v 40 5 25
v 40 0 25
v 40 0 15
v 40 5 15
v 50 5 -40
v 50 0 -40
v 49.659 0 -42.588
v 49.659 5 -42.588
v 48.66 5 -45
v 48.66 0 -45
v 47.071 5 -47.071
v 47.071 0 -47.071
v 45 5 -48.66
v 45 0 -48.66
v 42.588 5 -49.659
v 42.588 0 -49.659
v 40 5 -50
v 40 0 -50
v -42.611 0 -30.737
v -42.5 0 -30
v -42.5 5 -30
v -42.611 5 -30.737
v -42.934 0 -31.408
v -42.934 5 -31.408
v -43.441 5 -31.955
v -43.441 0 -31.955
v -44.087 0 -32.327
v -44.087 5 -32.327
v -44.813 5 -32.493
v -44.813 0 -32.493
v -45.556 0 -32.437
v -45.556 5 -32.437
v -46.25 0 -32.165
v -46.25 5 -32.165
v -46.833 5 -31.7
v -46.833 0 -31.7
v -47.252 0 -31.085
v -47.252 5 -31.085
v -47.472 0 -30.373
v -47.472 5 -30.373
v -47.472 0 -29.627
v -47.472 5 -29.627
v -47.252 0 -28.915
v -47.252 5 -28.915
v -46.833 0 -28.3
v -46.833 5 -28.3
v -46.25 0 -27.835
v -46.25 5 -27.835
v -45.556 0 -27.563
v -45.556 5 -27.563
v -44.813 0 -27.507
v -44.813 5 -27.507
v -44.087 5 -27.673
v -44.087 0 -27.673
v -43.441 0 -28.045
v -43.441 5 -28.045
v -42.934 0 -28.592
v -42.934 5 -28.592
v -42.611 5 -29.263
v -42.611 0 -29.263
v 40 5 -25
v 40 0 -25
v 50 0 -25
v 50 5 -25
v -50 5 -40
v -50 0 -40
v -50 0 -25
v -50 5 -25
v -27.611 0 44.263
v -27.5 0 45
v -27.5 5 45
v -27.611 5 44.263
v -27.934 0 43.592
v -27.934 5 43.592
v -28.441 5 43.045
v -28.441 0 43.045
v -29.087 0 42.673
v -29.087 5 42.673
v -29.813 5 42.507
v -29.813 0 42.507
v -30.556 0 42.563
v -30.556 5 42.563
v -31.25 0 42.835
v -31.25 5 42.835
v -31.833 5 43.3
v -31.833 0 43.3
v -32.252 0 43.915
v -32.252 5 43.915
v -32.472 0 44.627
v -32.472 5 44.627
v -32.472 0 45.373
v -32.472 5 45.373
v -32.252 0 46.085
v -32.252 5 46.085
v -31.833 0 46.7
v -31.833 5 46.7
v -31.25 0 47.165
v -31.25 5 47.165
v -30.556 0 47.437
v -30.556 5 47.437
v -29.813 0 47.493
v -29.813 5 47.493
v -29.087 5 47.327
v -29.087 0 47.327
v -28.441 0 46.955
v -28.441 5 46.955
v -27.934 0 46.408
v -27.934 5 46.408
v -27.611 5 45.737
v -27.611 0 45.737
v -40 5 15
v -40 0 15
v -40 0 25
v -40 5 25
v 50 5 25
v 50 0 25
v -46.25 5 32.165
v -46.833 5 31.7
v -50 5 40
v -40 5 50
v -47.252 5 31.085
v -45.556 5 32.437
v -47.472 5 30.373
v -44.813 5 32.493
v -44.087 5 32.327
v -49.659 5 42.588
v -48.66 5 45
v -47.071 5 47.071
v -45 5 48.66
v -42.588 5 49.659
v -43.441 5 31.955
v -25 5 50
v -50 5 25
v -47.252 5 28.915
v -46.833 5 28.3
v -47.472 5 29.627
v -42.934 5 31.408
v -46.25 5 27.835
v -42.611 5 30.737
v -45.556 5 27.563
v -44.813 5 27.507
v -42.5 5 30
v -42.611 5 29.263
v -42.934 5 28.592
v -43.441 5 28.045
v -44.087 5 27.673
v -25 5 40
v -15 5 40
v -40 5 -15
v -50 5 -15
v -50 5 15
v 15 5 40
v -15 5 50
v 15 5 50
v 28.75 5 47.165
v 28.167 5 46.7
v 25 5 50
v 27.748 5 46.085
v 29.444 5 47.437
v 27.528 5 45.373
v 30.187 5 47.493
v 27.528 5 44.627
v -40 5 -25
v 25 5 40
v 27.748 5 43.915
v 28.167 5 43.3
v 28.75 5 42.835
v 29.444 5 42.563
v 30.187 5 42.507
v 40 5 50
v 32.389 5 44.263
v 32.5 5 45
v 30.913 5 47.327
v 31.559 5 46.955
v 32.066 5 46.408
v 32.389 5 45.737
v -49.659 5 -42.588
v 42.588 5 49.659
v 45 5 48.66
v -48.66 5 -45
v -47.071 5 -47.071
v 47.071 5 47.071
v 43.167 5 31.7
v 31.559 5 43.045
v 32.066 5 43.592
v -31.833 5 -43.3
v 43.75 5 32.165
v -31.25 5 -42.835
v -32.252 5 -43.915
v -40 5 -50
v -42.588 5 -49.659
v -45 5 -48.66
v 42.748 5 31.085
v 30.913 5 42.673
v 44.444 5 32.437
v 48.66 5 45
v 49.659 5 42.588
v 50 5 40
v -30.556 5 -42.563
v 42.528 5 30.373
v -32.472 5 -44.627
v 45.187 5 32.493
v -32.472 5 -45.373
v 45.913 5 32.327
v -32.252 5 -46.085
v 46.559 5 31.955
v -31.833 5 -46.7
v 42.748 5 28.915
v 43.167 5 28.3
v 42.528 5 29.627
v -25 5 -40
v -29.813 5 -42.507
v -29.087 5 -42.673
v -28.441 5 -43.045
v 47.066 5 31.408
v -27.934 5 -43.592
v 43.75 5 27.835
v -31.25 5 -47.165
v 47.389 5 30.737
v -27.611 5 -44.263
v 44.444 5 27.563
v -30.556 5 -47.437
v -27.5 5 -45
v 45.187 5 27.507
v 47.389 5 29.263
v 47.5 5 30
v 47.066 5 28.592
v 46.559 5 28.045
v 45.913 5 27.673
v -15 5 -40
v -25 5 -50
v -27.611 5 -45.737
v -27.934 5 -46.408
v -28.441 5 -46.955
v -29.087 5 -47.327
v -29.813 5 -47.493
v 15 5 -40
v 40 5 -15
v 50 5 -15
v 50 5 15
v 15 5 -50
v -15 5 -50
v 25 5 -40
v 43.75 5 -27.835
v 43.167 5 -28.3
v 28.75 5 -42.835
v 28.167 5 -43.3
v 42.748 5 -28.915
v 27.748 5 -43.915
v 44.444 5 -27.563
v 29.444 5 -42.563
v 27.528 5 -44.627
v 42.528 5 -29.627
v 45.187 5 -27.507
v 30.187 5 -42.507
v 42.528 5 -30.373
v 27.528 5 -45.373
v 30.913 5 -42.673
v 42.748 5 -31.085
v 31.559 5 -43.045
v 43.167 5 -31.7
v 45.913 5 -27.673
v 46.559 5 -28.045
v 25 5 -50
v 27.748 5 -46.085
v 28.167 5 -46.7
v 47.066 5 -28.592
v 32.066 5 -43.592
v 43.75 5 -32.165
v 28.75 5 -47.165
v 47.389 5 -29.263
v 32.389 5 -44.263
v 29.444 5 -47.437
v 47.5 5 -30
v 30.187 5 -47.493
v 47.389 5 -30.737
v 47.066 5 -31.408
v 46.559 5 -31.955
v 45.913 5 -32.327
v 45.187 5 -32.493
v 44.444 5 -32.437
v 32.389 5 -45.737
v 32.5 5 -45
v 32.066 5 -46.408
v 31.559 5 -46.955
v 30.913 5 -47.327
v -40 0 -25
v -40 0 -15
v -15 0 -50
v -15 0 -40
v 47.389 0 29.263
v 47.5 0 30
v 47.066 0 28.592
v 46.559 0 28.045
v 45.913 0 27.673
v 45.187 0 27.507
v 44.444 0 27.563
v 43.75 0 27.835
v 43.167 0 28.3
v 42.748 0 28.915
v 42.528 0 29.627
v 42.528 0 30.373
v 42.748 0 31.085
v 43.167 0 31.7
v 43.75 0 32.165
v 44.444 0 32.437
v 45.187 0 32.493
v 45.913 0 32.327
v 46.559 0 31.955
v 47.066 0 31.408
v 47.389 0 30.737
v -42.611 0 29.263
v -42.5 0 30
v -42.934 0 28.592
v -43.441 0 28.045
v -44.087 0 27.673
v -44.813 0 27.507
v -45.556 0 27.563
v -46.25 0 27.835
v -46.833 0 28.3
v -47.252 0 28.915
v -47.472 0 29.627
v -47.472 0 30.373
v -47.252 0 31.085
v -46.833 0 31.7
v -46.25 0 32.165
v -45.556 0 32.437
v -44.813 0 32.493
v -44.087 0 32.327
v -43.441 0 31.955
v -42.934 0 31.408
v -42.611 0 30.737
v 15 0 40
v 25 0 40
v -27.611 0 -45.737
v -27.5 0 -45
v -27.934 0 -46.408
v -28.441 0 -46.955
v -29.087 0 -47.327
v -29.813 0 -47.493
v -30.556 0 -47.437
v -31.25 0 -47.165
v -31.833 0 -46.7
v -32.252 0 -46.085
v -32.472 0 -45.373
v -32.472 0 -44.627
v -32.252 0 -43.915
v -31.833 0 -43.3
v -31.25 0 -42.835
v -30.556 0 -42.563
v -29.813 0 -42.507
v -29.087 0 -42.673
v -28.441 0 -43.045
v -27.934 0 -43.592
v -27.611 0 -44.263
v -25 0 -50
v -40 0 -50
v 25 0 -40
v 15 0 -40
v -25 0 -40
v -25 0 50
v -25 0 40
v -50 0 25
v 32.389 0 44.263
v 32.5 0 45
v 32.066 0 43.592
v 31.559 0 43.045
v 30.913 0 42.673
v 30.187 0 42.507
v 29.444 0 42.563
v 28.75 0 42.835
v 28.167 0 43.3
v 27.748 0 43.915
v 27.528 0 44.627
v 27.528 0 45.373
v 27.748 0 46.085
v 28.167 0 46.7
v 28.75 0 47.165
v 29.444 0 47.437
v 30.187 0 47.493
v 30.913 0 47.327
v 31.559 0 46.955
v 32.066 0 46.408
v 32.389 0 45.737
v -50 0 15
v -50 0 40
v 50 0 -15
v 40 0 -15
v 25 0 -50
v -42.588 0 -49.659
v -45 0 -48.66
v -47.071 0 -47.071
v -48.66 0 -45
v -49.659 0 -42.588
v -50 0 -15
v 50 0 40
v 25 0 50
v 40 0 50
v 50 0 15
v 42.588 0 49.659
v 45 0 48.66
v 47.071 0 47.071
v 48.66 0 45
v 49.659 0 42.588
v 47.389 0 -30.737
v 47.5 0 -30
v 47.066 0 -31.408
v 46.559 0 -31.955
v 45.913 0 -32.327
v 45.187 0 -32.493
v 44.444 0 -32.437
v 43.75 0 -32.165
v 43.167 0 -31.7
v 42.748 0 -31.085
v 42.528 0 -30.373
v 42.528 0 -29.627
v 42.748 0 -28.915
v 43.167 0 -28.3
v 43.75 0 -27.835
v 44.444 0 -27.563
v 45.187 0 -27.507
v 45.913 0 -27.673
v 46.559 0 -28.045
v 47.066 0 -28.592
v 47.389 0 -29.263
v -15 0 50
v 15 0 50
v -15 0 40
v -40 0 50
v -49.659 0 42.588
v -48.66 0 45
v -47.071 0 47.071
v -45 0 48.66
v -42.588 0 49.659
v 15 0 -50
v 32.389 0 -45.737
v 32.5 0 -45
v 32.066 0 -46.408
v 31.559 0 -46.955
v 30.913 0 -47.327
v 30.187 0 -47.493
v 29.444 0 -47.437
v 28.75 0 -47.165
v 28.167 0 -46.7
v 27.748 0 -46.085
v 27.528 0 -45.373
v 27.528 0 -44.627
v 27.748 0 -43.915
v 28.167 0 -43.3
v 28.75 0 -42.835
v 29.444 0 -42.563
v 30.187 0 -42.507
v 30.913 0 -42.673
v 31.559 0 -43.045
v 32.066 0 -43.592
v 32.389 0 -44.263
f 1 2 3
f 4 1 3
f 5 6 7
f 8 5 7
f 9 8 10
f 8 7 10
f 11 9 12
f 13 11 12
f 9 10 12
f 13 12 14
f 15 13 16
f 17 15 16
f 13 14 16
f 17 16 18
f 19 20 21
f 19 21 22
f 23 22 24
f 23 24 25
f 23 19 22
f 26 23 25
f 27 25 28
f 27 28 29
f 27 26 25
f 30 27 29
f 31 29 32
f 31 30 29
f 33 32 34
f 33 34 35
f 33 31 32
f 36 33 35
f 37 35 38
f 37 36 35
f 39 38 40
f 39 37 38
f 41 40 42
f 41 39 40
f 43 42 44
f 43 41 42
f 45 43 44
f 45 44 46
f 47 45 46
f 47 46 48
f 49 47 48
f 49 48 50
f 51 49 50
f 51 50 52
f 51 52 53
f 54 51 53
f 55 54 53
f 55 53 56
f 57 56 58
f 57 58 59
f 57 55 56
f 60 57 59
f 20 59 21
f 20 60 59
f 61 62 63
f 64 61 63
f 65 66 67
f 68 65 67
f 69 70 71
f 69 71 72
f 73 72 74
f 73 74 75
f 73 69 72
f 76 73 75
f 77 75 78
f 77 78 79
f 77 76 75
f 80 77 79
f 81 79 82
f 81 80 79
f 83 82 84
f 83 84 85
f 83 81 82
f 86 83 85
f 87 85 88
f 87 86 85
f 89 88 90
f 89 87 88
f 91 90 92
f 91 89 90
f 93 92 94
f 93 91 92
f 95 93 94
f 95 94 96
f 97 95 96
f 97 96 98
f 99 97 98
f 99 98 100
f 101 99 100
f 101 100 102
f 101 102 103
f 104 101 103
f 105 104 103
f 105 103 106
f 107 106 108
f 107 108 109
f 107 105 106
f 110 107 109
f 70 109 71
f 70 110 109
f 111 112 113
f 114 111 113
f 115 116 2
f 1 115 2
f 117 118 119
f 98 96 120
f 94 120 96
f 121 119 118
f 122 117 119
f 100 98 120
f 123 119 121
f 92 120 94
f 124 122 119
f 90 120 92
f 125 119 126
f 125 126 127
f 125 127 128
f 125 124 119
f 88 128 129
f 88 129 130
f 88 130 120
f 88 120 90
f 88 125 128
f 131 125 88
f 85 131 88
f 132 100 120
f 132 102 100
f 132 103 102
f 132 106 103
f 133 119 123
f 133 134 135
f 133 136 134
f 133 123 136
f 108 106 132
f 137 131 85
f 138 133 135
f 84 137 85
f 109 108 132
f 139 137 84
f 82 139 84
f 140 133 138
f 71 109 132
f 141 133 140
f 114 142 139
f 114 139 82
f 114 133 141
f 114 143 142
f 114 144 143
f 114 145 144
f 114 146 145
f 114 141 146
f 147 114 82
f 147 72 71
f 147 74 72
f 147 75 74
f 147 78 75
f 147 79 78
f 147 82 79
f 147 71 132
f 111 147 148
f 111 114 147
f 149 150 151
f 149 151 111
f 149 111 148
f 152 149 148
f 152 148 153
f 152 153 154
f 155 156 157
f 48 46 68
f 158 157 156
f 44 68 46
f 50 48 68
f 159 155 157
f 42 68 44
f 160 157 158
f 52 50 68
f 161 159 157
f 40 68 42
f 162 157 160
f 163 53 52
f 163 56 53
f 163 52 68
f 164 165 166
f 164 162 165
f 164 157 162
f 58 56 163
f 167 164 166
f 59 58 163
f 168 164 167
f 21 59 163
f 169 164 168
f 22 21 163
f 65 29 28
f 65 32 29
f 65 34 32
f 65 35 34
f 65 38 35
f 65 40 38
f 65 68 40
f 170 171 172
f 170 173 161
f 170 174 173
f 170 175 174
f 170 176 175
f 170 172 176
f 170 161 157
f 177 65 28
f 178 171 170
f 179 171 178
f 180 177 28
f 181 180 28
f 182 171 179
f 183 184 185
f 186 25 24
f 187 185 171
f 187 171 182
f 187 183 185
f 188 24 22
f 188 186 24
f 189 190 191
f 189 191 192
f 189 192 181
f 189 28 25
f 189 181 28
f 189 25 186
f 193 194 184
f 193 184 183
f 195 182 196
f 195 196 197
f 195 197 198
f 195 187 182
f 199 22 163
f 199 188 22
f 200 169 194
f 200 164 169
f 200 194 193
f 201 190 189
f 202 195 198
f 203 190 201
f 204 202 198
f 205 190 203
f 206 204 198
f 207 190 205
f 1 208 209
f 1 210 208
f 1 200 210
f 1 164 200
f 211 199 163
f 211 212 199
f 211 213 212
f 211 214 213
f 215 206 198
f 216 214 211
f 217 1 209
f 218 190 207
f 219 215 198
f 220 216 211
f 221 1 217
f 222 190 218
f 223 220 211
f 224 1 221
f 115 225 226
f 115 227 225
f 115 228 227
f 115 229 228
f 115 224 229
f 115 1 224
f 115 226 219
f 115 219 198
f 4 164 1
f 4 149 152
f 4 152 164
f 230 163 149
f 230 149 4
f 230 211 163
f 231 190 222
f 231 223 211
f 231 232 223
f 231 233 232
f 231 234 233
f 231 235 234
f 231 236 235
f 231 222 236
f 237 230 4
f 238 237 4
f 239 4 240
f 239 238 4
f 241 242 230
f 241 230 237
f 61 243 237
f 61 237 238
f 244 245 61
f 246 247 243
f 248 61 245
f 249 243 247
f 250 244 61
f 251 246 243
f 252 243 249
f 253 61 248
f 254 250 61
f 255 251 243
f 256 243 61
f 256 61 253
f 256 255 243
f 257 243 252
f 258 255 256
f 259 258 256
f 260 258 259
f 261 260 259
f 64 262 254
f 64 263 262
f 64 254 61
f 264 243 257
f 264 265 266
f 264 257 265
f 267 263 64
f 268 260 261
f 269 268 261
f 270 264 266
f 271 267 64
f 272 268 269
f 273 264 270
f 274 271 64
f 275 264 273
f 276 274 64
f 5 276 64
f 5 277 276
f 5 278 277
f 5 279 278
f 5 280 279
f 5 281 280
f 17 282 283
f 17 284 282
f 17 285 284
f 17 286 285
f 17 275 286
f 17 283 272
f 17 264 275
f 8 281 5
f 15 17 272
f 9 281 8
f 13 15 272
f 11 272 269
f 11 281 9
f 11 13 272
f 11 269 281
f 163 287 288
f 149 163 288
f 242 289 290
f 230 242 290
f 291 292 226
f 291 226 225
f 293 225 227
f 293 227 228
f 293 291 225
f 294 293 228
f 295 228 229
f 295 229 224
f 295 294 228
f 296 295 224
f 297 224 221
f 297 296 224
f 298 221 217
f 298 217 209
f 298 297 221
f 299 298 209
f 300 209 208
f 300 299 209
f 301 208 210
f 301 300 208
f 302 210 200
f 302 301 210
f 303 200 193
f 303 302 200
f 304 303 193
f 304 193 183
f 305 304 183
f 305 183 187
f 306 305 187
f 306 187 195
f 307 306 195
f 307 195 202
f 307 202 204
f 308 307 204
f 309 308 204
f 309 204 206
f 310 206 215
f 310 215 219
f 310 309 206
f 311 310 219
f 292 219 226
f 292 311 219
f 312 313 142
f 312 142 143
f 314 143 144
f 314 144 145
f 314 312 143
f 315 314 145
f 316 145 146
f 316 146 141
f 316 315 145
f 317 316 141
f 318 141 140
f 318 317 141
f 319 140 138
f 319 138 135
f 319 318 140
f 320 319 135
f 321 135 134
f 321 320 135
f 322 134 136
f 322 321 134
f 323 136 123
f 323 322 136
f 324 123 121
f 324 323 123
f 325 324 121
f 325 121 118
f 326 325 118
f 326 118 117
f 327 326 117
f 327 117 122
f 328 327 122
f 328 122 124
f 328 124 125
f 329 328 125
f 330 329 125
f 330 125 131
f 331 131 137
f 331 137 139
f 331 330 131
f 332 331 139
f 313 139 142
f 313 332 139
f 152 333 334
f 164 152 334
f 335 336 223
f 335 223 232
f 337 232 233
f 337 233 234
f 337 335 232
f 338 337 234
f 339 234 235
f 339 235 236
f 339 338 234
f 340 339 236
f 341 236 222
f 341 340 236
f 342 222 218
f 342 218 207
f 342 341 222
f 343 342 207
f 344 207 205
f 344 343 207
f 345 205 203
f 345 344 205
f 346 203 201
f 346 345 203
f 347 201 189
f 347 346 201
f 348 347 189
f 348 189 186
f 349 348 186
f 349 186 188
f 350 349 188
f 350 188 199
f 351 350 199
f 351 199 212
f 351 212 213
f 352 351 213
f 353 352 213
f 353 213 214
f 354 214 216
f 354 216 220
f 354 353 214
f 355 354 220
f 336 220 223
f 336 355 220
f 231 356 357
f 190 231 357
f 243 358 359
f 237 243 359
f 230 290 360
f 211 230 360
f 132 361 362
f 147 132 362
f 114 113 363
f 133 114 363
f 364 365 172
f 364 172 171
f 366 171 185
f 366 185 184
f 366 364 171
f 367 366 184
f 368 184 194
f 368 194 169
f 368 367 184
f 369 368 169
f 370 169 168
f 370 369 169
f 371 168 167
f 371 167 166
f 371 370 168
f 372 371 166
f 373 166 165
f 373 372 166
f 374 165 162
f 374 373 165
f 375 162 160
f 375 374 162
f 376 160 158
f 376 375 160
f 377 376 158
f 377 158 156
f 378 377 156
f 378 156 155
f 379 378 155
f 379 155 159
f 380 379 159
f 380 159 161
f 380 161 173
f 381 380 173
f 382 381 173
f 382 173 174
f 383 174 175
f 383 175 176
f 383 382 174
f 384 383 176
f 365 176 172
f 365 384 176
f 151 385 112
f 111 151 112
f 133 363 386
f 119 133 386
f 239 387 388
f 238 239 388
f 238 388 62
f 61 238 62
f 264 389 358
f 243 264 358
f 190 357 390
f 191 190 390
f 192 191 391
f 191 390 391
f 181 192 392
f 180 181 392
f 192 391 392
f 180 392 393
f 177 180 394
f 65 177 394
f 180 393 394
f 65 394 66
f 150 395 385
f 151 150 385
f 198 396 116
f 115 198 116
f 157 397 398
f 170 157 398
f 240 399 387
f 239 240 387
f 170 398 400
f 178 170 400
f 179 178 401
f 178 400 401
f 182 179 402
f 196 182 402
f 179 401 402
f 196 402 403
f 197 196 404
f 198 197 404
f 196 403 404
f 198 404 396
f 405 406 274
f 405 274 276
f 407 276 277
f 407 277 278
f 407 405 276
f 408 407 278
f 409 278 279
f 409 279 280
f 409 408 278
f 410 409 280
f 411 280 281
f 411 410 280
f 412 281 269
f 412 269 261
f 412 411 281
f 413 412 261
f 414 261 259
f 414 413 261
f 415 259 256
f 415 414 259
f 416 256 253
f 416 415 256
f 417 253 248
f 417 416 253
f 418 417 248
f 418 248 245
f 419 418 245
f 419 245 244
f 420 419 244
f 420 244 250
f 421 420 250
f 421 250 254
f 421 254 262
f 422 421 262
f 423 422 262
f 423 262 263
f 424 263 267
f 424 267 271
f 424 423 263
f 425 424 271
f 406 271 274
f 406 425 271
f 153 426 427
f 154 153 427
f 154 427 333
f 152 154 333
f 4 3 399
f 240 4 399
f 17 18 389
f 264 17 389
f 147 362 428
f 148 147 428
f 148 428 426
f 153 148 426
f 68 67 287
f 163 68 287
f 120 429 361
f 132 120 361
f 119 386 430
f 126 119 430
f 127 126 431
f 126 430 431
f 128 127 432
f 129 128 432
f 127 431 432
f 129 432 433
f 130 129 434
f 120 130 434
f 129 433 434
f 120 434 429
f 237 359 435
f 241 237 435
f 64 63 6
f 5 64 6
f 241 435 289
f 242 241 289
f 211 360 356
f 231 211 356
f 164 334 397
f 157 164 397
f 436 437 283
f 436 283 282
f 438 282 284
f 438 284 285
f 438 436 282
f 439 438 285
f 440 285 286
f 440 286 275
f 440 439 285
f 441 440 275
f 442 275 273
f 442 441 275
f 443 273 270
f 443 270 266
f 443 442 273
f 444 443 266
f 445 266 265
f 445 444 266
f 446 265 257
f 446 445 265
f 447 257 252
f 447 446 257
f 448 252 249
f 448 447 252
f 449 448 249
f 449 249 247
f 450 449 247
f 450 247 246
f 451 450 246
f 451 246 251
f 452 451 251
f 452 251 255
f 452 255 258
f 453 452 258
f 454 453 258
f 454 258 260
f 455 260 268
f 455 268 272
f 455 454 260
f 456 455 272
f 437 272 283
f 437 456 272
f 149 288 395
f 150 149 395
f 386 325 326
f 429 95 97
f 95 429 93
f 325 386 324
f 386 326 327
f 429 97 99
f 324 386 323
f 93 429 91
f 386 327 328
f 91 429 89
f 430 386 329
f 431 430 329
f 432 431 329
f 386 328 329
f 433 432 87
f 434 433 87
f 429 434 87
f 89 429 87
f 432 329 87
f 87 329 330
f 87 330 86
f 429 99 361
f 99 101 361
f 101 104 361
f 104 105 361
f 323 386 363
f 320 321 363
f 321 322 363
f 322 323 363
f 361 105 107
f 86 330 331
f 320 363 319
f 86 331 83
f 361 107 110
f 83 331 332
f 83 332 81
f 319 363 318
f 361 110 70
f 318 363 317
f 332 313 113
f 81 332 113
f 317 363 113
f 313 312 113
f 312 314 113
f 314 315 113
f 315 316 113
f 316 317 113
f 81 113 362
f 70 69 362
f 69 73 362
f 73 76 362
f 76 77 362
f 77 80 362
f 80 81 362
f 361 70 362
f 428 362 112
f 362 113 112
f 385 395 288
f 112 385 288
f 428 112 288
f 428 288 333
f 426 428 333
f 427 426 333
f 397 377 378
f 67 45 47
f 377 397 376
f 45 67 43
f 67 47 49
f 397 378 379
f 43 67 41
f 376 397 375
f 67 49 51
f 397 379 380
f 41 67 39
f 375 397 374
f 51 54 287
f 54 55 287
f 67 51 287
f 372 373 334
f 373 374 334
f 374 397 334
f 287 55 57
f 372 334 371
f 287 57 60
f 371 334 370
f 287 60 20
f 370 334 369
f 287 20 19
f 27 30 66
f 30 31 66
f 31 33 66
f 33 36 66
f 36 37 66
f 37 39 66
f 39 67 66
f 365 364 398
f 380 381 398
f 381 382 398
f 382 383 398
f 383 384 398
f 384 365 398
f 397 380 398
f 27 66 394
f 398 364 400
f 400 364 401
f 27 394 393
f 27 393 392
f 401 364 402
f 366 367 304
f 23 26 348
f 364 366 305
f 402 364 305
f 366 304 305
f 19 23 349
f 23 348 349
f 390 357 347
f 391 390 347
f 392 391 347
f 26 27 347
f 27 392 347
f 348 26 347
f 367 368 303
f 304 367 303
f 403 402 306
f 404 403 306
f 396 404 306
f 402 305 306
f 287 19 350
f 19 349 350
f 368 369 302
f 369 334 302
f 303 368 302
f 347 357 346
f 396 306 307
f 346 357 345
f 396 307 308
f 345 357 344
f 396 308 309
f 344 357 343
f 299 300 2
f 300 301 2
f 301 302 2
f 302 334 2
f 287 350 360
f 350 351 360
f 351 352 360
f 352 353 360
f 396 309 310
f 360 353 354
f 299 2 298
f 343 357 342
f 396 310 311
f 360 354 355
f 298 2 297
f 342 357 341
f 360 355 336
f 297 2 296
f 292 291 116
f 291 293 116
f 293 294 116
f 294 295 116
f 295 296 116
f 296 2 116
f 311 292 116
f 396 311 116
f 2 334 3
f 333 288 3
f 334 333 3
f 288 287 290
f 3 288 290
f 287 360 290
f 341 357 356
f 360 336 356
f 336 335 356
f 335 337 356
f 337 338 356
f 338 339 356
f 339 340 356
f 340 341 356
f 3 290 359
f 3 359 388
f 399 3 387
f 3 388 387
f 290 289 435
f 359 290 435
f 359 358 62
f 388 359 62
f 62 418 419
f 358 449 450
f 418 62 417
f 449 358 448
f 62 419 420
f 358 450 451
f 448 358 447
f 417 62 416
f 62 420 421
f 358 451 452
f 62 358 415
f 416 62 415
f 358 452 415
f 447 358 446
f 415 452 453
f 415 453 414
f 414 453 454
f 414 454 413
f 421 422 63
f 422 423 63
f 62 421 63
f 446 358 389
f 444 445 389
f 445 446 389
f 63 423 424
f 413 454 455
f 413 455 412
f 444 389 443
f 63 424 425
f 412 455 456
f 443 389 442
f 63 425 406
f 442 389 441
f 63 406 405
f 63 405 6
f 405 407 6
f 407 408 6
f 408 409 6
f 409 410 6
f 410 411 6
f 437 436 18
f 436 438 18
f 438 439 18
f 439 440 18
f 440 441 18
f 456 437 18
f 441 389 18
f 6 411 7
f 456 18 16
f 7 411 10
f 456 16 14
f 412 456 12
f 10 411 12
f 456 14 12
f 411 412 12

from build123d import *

# Parameters (mm, degrees)
SKETCH1_R           = 2.5
BOSS_EXTRUDE1_DEPTH = 5


with BuildPart() as part:
    # Sketch1 → Boss-Extrude1 (new body)
    with BuildSketch(Plane(origin=(0, 0, 0), x_dir=(1, 0, 0), z_dir=(0, 1, 0))):
        with BuildLine():
            Line((25, -50), (40, -50))
            ThreePointArc((40, -50), (47.071067812, -47.071067812), (50, -40))
            Line((50, -40), (50, -25))
            Line((50, -25), (40, -25))
            Line((40, -25), (40, -15))
            Line((40, -15), (50, -15))
            Line((50, -15), (50, 15))
            Line((50, 15), (40, 15))
            Line((40, 15), (40, 25))
            Line((40, 25), (50, 25))
            Line((50, 25), (50, 40))
            ThreePointArc((50, 40), (47.071067812, 47.071067812), (40, 50))
            Line((40, 50), (30, 50))
            Line((30, 50), (25, 50))
            Line((25, 50), (25, 40))
            Line((25, 40), (15, 40))
            Line((15, 40), (15, 50))
            Line((15, 50), (-15, 50))
            Line((-15, 50), (-15, 40))
            Line((-15, 40), (-25, 40))
            Line((-25, 40), (-25, 50))
            Line((-25, 50), (-40, 50))
            ThreePointArc((-40, 50), (-47.071067812, 47.071067812), (-50, 40))
            Line((-50, 40), (-50, 25))
            Line((-50, 25), (-40, 25))
            Line((-40, 25), (-40, 15))
            Line((-40, 15), (-50, 15))
            Line((-50, 15), (-50, -15))
            Line((-50, -15), (-40, -15))
            Line((-40, -15), (-40, -25))
            Line((-40, -25), (-50, -25))
            Line((-50, -25), (-50, -40))
            ThreePointArc((-50, -40), (-47.071067812, -47.071067812), (-40, -50))
            Line((-40, -50), (-25, -50))
            Line((-25, -50), (-25, -40))
            Line((-25, -40), (-15, -40))
            Line((-15, -40), (-15, -50))
            Line((-15, -50), (15, -50))
            Line((15, -50), (15, -40))
            Line((15, -40), (25, -40))
            Line((25, -40), (25, -50))
        make_face()
        with Locations((-30, -45)):
            Circle(SKETCH1_R, mode=Mode.SUBTRACT)
        with Locations((-45, -30)):
            Circle(SKETCH1_R, mode=Mode.SUBTRACT)
        with Locations((30, -45)):
            Circle(SKETCH1_R, mode=Mode.SUBTRACT)
        with Locations((45, -30)):
            Circle(SKETCH1_R, mode=Mode.SUBTRACT)
        with Locations((-45, 30)):
            Circle(SKETCH1_R, mode=Mode.SUBTRACT)
        with Locations((-30, 45)):
            Circle(SKETCH1_R, mode=Mode.SUBTRACT)
        with Locations((45, 30)):
            Circle(SKETCH1_R, mode=Mode.SUBTRACT)
        with Locations((30, 45)):
            Circle(SKETCH1_R, mode=Mode.SUBTRACT)
    extrude(amount=BOSS_EXTRUDE1_DEPTH)


solid = part.part
